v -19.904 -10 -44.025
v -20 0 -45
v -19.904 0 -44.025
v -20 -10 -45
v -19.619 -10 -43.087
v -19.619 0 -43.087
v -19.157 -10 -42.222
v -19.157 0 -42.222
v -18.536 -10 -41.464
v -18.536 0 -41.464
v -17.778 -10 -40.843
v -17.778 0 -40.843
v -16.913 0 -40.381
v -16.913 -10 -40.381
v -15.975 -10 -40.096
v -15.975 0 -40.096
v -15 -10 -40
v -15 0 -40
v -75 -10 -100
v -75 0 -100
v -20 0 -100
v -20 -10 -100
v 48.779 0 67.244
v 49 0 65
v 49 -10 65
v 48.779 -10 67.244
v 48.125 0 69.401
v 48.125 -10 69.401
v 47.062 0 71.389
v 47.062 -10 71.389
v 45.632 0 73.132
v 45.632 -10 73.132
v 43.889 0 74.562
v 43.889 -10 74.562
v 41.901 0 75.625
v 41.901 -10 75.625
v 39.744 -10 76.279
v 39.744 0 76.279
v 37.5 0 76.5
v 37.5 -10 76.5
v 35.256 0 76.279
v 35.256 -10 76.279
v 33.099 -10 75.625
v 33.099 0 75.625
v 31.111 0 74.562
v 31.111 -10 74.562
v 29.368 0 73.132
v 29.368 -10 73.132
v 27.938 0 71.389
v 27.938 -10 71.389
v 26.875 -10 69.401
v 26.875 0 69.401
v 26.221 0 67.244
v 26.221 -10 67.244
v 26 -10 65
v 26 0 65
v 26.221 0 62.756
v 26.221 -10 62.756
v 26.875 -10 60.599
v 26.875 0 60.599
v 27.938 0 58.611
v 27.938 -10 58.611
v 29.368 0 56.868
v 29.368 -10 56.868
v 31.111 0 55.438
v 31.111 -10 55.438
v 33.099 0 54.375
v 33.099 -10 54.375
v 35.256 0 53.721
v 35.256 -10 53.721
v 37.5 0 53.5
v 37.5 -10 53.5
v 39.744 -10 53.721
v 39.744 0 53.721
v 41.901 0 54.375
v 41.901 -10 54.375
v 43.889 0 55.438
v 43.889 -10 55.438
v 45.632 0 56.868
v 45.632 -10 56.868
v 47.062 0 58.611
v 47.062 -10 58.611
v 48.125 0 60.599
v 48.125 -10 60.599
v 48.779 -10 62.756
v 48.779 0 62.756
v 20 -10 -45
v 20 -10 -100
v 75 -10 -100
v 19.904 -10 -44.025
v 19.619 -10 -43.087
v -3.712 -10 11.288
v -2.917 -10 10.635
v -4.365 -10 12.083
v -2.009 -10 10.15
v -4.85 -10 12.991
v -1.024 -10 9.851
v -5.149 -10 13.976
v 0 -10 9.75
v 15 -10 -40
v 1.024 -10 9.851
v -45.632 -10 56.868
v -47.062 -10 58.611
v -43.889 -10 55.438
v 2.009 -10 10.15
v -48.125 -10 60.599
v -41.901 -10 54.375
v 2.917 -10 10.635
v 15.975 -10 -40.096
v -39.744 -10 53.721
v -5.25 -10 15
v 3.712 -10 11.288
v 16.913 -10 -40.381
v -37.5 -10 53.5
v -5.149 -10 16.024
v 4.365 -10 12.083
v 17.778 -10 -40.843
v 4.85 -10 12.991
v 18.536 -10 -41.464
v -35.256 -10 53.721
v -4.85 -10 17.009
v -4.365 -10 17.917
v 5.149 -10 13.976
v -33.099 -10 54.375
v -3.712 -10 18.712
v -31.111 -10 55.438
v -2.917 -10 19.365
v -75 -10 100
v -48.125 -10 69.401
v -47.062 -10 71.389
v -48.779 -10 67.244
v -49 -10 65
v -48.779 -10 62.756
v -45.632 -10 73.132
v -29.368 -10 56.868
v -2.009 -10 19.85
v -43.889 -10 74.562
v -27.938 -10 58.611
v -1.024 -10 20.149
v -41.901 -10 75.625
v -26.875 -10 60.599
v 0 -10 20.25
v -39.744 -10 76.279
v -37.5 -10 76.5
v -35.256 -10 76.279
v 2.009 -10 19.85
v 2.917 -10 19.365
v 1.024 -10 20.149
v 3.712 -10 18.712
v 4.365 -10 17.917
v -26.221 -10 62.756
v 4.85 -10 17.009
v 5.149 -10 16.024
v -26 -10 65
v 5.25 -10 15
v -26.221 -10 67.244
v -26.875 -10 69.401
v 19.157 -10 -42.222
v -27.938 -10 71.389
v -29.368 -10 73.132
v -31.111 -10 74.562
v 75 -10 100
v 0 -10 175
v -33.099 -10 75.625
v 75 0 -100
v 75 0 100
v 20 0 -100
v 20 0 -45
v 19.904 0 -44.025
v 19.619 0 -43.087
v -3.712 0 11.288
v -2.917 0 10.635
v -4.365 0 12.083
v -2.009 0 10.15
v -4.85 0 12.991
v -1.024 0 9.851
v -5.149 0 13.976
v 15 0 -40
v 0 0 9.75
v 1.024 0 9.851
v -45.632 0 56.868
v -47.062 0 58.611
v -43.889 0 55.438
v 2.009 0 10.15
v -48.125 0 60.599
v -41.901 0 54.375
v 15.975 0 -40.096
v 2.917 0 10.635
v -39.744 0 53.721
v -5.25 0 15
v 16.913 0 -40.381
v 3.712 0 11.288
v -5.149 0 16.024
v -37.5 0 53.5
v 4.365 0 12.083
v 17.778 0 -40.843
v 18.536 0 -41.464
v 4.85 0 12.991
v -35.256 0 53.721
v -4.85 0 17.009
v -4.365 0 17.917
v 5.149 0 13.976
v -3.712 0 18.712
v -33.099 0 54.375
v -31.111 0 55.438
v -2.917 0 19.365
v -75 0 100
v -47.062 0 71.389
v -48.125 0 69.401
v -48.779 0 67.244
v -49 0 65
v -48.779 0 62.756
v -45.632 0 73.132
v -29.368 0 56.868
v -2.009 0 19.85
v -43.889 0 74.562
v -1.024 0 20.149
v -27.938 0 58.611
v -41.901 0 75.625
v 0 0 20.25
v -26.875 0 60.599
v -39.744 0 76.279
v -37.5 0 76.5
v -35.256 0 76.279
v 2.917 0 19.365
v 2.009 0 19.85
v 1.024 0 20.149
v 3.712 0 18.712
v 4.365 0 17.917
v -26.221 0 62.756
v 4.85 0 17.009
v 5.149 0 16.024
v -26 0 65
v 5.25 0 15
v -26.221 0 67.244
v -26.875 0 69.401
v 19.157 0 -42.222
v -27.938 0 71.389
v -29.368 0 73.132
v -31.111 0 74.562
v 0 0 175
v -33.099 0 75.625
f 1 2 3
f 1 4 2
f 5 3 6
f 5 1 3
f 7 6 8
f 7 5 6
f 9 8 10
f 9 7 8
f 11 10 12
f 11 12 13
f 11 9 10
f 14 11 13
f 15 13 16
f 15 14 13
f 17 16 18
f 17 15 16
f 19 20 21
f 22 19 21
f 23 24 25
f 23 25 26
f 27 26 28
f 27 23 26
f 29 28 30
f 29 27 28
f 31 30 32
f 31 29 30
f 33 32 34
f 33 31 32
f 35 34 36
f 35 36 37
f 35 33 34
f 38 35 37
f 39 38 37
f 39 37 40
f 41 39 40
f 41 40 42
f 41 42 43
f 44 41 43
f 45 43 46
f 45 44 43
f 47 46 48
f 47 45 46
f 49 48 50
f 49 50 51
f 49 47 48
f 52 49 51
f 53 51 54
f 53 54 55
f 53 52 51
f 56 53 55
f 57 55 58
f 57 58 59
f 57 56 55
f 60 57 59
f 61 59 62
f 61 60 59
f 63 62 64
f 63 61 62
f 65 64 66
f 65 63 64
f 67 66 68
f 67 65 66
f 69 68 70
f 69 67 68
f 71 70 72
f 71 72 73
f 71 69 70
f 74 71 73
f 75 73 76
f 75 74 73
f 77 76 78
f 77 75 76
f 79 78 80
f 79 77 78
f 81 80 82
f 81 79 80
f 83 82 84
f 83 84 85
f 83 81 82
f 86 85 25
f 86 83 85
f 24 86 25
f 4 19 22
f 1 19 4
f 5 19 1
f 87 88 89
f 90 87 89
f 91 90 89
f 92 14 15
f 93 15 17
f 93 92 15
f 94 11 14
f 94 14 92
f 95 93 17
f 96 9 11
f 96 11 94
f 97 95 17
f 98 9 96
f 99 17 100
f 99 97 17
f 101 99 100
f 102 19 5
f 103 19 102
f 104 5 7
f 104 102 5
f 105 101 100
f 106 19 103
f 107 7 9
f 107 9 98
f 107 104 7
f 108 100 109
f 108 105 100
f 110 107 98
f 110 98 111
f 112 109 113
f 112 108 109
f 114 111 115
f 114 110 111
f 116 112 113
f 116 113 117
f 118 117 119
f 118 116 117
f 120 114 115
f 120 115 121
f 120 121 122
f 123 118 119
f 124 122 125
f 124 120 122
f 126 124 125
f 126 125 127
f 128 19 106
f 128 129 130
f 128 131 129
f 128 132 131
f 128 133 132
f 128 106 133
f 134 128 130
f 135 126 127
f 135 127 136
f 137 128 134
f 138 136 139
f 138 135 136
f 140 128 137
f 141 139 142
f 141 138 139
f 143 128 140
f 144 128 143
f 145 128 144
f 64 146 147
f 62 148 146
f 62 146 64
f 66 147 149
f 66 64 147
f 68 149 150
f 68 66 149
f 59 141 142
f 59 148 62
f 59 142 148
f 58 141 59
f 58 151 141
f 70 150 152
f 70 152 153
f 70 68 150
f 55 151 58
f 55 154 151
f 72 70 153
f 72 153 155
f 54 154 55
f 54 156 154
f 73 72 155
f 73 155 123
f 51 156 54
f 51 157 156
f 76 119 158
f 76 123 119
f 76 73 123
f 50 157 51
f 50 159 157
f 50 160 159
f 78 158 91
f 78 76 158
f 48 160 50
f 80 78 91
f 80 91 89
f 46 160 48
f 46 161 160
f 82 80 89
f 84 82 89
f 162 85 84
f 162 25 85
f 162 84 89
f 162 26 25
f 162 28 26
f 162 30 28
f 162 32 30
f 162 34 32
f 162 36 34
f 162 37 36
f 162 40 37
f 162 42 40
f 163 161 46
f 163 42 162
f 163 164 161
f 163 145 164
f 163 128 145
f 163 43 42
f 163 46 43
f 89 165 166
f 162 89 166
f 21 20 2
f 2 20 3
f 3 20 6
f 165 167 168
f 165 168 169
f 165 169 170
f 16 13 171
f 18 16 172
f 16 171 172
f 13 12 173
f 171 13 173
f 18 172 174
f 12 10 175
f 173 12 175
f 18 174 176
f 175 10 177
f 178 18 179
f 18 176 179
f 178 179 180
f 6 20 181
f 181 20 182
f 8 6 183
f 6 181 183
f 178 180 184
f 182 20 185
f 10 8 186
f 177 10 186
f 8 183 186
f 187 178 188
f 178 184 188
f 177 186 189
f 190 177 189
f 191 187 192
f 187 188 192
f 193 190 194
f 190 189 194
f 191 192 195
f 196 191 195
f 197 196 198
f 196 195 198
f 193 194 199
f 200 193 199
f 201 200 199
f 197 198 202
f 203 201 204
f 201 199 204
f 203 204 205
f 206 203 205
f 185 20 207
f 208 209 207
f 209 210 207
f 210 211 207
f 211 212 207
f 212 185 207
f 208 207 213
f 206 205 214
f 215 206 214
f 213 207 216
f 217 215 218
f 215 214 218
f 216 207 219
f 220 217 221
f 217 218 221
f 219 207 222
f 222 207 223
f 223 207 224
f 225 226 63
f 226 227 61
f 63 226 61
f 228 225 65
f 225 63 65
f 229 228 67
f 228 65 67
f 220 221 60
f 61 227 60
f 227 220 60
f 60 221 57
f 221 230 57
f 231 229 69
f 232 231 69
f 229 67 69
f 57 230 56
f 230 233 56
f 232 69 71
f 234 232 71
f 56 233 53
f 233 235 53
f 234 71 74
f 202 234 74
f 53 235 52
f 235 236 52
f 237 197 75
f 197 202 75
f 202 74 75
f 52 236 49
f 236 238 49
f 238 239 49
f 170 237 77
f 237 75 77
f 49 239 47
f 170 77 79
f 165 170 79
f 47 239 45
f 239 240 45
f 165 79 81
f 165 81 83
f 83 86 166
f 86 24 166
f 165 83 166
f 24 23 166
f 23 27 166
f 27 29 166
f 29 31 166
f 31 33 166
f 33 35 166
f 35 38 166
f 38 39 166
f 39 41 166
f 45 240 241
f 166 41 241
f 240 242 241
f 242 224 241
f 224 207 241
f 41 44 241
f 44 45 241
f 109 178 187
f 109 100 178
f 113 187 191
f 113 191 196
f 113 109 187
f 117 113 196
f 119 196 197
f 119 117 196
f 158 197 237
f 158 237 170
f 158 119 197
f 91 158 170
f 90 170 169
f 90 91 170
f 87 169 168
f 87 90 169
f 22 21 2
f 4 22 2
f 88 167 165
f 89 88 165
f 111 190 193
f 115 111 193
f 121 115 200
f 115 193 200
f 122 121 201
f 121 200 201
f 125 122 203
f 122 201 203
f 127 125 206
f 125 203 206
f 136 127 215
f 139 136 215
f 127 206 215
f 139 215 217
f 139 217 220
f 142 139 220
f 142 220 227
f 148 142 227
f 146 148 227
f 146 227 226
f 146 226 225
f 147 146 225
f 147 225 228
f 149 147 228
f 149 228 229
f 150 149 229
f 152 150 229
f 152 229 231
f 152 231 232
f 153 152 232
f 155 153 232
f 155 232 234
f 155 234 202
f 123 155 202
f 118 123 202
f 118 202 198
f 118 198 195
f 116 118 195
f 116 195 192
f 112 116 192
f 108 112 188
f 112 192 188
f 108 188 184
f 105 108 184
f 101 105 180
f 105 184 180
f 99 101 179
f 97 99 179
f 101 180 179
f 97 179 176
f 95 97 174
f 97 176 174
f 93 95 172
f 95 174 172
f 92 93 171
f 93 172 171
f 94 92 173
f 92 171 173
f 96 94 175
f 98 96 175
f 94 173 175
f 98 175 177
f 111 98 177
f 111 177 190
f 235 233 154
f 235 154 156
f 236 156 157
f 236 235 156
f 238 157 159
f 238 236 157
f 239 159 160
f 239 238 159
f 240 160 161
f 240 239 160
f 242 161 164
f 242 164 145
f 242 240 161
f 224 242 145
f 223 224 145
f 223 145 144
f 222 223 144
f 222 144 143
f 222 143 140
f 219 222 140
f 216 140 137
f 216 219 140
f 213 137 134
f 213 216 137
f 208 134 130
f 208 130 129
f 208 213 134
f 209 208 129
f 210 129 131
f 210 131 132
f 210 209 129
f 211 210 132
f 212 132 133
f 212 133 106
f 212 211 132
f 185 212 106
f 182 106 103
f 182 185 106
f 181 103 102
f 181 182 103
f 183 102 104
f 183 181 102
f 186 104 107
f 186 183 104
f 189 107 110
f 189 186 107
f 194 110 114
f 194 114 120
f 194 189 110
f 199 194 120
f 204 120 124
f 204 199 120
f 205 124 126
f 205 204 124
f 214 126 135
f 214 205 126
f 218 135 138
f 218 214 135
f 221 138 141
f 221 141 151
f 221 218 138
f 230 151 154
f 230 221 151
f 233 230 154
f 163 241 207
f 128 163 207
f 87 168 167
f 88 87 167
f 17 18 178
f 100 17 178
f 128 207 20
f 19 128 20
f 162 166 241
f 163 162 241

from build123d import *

# Parameters (mm, degrees)
F0_R     = 11.5
F1_DEPTH = 10
F2_R     = 5
F3_R     = 5.25
F4_DEPTH = 10.001


with BuildPart() as f1:
    # F0 (on Front) → F1 (new body)
    with BuildSketch(Plane.XZ):
        Polygon((75, -100), (75, 100), (0, 100), (-75, 100), (-75, -100), (-20, -100), (-20, -40), (20, -40), (20, -100), align=None)
        with Locations((-37.5, 65)):
            Circle(F0_R, mode=Mode.SUBTRACT)
        with Locations((37.5, 65)):
            Circle(F0_R, mode=Mode.SUBTRACT)
        Polygon((0, 100), (75, 100), (0, 175), align=None)
        Polygon((-75, 100), (0, 100), (0, 175), align=None)
    extrude(amount=F1_DEPTH)

    # F2
    f2_edges = [f1.edges().sort_by_distance(p)[0] for p in [
        (-20, -5, -40),
        (20, -5, -40),
    ]]
    fillet(f2_edges, radius=F2_R)

    # F3 (on face) → F4 (cut, through all)
    with BuildSketch(Plane(origin=(0, 0, 0), x_dir=(-1, 0, 0), z_dir=(0, 1, 0))):
        with Locations((0, 15)):
            Circle(F3_R)
    extrude(amount=-F4_DEPTH, mode=Mode.SUBTRACT)


solid = f1.part
